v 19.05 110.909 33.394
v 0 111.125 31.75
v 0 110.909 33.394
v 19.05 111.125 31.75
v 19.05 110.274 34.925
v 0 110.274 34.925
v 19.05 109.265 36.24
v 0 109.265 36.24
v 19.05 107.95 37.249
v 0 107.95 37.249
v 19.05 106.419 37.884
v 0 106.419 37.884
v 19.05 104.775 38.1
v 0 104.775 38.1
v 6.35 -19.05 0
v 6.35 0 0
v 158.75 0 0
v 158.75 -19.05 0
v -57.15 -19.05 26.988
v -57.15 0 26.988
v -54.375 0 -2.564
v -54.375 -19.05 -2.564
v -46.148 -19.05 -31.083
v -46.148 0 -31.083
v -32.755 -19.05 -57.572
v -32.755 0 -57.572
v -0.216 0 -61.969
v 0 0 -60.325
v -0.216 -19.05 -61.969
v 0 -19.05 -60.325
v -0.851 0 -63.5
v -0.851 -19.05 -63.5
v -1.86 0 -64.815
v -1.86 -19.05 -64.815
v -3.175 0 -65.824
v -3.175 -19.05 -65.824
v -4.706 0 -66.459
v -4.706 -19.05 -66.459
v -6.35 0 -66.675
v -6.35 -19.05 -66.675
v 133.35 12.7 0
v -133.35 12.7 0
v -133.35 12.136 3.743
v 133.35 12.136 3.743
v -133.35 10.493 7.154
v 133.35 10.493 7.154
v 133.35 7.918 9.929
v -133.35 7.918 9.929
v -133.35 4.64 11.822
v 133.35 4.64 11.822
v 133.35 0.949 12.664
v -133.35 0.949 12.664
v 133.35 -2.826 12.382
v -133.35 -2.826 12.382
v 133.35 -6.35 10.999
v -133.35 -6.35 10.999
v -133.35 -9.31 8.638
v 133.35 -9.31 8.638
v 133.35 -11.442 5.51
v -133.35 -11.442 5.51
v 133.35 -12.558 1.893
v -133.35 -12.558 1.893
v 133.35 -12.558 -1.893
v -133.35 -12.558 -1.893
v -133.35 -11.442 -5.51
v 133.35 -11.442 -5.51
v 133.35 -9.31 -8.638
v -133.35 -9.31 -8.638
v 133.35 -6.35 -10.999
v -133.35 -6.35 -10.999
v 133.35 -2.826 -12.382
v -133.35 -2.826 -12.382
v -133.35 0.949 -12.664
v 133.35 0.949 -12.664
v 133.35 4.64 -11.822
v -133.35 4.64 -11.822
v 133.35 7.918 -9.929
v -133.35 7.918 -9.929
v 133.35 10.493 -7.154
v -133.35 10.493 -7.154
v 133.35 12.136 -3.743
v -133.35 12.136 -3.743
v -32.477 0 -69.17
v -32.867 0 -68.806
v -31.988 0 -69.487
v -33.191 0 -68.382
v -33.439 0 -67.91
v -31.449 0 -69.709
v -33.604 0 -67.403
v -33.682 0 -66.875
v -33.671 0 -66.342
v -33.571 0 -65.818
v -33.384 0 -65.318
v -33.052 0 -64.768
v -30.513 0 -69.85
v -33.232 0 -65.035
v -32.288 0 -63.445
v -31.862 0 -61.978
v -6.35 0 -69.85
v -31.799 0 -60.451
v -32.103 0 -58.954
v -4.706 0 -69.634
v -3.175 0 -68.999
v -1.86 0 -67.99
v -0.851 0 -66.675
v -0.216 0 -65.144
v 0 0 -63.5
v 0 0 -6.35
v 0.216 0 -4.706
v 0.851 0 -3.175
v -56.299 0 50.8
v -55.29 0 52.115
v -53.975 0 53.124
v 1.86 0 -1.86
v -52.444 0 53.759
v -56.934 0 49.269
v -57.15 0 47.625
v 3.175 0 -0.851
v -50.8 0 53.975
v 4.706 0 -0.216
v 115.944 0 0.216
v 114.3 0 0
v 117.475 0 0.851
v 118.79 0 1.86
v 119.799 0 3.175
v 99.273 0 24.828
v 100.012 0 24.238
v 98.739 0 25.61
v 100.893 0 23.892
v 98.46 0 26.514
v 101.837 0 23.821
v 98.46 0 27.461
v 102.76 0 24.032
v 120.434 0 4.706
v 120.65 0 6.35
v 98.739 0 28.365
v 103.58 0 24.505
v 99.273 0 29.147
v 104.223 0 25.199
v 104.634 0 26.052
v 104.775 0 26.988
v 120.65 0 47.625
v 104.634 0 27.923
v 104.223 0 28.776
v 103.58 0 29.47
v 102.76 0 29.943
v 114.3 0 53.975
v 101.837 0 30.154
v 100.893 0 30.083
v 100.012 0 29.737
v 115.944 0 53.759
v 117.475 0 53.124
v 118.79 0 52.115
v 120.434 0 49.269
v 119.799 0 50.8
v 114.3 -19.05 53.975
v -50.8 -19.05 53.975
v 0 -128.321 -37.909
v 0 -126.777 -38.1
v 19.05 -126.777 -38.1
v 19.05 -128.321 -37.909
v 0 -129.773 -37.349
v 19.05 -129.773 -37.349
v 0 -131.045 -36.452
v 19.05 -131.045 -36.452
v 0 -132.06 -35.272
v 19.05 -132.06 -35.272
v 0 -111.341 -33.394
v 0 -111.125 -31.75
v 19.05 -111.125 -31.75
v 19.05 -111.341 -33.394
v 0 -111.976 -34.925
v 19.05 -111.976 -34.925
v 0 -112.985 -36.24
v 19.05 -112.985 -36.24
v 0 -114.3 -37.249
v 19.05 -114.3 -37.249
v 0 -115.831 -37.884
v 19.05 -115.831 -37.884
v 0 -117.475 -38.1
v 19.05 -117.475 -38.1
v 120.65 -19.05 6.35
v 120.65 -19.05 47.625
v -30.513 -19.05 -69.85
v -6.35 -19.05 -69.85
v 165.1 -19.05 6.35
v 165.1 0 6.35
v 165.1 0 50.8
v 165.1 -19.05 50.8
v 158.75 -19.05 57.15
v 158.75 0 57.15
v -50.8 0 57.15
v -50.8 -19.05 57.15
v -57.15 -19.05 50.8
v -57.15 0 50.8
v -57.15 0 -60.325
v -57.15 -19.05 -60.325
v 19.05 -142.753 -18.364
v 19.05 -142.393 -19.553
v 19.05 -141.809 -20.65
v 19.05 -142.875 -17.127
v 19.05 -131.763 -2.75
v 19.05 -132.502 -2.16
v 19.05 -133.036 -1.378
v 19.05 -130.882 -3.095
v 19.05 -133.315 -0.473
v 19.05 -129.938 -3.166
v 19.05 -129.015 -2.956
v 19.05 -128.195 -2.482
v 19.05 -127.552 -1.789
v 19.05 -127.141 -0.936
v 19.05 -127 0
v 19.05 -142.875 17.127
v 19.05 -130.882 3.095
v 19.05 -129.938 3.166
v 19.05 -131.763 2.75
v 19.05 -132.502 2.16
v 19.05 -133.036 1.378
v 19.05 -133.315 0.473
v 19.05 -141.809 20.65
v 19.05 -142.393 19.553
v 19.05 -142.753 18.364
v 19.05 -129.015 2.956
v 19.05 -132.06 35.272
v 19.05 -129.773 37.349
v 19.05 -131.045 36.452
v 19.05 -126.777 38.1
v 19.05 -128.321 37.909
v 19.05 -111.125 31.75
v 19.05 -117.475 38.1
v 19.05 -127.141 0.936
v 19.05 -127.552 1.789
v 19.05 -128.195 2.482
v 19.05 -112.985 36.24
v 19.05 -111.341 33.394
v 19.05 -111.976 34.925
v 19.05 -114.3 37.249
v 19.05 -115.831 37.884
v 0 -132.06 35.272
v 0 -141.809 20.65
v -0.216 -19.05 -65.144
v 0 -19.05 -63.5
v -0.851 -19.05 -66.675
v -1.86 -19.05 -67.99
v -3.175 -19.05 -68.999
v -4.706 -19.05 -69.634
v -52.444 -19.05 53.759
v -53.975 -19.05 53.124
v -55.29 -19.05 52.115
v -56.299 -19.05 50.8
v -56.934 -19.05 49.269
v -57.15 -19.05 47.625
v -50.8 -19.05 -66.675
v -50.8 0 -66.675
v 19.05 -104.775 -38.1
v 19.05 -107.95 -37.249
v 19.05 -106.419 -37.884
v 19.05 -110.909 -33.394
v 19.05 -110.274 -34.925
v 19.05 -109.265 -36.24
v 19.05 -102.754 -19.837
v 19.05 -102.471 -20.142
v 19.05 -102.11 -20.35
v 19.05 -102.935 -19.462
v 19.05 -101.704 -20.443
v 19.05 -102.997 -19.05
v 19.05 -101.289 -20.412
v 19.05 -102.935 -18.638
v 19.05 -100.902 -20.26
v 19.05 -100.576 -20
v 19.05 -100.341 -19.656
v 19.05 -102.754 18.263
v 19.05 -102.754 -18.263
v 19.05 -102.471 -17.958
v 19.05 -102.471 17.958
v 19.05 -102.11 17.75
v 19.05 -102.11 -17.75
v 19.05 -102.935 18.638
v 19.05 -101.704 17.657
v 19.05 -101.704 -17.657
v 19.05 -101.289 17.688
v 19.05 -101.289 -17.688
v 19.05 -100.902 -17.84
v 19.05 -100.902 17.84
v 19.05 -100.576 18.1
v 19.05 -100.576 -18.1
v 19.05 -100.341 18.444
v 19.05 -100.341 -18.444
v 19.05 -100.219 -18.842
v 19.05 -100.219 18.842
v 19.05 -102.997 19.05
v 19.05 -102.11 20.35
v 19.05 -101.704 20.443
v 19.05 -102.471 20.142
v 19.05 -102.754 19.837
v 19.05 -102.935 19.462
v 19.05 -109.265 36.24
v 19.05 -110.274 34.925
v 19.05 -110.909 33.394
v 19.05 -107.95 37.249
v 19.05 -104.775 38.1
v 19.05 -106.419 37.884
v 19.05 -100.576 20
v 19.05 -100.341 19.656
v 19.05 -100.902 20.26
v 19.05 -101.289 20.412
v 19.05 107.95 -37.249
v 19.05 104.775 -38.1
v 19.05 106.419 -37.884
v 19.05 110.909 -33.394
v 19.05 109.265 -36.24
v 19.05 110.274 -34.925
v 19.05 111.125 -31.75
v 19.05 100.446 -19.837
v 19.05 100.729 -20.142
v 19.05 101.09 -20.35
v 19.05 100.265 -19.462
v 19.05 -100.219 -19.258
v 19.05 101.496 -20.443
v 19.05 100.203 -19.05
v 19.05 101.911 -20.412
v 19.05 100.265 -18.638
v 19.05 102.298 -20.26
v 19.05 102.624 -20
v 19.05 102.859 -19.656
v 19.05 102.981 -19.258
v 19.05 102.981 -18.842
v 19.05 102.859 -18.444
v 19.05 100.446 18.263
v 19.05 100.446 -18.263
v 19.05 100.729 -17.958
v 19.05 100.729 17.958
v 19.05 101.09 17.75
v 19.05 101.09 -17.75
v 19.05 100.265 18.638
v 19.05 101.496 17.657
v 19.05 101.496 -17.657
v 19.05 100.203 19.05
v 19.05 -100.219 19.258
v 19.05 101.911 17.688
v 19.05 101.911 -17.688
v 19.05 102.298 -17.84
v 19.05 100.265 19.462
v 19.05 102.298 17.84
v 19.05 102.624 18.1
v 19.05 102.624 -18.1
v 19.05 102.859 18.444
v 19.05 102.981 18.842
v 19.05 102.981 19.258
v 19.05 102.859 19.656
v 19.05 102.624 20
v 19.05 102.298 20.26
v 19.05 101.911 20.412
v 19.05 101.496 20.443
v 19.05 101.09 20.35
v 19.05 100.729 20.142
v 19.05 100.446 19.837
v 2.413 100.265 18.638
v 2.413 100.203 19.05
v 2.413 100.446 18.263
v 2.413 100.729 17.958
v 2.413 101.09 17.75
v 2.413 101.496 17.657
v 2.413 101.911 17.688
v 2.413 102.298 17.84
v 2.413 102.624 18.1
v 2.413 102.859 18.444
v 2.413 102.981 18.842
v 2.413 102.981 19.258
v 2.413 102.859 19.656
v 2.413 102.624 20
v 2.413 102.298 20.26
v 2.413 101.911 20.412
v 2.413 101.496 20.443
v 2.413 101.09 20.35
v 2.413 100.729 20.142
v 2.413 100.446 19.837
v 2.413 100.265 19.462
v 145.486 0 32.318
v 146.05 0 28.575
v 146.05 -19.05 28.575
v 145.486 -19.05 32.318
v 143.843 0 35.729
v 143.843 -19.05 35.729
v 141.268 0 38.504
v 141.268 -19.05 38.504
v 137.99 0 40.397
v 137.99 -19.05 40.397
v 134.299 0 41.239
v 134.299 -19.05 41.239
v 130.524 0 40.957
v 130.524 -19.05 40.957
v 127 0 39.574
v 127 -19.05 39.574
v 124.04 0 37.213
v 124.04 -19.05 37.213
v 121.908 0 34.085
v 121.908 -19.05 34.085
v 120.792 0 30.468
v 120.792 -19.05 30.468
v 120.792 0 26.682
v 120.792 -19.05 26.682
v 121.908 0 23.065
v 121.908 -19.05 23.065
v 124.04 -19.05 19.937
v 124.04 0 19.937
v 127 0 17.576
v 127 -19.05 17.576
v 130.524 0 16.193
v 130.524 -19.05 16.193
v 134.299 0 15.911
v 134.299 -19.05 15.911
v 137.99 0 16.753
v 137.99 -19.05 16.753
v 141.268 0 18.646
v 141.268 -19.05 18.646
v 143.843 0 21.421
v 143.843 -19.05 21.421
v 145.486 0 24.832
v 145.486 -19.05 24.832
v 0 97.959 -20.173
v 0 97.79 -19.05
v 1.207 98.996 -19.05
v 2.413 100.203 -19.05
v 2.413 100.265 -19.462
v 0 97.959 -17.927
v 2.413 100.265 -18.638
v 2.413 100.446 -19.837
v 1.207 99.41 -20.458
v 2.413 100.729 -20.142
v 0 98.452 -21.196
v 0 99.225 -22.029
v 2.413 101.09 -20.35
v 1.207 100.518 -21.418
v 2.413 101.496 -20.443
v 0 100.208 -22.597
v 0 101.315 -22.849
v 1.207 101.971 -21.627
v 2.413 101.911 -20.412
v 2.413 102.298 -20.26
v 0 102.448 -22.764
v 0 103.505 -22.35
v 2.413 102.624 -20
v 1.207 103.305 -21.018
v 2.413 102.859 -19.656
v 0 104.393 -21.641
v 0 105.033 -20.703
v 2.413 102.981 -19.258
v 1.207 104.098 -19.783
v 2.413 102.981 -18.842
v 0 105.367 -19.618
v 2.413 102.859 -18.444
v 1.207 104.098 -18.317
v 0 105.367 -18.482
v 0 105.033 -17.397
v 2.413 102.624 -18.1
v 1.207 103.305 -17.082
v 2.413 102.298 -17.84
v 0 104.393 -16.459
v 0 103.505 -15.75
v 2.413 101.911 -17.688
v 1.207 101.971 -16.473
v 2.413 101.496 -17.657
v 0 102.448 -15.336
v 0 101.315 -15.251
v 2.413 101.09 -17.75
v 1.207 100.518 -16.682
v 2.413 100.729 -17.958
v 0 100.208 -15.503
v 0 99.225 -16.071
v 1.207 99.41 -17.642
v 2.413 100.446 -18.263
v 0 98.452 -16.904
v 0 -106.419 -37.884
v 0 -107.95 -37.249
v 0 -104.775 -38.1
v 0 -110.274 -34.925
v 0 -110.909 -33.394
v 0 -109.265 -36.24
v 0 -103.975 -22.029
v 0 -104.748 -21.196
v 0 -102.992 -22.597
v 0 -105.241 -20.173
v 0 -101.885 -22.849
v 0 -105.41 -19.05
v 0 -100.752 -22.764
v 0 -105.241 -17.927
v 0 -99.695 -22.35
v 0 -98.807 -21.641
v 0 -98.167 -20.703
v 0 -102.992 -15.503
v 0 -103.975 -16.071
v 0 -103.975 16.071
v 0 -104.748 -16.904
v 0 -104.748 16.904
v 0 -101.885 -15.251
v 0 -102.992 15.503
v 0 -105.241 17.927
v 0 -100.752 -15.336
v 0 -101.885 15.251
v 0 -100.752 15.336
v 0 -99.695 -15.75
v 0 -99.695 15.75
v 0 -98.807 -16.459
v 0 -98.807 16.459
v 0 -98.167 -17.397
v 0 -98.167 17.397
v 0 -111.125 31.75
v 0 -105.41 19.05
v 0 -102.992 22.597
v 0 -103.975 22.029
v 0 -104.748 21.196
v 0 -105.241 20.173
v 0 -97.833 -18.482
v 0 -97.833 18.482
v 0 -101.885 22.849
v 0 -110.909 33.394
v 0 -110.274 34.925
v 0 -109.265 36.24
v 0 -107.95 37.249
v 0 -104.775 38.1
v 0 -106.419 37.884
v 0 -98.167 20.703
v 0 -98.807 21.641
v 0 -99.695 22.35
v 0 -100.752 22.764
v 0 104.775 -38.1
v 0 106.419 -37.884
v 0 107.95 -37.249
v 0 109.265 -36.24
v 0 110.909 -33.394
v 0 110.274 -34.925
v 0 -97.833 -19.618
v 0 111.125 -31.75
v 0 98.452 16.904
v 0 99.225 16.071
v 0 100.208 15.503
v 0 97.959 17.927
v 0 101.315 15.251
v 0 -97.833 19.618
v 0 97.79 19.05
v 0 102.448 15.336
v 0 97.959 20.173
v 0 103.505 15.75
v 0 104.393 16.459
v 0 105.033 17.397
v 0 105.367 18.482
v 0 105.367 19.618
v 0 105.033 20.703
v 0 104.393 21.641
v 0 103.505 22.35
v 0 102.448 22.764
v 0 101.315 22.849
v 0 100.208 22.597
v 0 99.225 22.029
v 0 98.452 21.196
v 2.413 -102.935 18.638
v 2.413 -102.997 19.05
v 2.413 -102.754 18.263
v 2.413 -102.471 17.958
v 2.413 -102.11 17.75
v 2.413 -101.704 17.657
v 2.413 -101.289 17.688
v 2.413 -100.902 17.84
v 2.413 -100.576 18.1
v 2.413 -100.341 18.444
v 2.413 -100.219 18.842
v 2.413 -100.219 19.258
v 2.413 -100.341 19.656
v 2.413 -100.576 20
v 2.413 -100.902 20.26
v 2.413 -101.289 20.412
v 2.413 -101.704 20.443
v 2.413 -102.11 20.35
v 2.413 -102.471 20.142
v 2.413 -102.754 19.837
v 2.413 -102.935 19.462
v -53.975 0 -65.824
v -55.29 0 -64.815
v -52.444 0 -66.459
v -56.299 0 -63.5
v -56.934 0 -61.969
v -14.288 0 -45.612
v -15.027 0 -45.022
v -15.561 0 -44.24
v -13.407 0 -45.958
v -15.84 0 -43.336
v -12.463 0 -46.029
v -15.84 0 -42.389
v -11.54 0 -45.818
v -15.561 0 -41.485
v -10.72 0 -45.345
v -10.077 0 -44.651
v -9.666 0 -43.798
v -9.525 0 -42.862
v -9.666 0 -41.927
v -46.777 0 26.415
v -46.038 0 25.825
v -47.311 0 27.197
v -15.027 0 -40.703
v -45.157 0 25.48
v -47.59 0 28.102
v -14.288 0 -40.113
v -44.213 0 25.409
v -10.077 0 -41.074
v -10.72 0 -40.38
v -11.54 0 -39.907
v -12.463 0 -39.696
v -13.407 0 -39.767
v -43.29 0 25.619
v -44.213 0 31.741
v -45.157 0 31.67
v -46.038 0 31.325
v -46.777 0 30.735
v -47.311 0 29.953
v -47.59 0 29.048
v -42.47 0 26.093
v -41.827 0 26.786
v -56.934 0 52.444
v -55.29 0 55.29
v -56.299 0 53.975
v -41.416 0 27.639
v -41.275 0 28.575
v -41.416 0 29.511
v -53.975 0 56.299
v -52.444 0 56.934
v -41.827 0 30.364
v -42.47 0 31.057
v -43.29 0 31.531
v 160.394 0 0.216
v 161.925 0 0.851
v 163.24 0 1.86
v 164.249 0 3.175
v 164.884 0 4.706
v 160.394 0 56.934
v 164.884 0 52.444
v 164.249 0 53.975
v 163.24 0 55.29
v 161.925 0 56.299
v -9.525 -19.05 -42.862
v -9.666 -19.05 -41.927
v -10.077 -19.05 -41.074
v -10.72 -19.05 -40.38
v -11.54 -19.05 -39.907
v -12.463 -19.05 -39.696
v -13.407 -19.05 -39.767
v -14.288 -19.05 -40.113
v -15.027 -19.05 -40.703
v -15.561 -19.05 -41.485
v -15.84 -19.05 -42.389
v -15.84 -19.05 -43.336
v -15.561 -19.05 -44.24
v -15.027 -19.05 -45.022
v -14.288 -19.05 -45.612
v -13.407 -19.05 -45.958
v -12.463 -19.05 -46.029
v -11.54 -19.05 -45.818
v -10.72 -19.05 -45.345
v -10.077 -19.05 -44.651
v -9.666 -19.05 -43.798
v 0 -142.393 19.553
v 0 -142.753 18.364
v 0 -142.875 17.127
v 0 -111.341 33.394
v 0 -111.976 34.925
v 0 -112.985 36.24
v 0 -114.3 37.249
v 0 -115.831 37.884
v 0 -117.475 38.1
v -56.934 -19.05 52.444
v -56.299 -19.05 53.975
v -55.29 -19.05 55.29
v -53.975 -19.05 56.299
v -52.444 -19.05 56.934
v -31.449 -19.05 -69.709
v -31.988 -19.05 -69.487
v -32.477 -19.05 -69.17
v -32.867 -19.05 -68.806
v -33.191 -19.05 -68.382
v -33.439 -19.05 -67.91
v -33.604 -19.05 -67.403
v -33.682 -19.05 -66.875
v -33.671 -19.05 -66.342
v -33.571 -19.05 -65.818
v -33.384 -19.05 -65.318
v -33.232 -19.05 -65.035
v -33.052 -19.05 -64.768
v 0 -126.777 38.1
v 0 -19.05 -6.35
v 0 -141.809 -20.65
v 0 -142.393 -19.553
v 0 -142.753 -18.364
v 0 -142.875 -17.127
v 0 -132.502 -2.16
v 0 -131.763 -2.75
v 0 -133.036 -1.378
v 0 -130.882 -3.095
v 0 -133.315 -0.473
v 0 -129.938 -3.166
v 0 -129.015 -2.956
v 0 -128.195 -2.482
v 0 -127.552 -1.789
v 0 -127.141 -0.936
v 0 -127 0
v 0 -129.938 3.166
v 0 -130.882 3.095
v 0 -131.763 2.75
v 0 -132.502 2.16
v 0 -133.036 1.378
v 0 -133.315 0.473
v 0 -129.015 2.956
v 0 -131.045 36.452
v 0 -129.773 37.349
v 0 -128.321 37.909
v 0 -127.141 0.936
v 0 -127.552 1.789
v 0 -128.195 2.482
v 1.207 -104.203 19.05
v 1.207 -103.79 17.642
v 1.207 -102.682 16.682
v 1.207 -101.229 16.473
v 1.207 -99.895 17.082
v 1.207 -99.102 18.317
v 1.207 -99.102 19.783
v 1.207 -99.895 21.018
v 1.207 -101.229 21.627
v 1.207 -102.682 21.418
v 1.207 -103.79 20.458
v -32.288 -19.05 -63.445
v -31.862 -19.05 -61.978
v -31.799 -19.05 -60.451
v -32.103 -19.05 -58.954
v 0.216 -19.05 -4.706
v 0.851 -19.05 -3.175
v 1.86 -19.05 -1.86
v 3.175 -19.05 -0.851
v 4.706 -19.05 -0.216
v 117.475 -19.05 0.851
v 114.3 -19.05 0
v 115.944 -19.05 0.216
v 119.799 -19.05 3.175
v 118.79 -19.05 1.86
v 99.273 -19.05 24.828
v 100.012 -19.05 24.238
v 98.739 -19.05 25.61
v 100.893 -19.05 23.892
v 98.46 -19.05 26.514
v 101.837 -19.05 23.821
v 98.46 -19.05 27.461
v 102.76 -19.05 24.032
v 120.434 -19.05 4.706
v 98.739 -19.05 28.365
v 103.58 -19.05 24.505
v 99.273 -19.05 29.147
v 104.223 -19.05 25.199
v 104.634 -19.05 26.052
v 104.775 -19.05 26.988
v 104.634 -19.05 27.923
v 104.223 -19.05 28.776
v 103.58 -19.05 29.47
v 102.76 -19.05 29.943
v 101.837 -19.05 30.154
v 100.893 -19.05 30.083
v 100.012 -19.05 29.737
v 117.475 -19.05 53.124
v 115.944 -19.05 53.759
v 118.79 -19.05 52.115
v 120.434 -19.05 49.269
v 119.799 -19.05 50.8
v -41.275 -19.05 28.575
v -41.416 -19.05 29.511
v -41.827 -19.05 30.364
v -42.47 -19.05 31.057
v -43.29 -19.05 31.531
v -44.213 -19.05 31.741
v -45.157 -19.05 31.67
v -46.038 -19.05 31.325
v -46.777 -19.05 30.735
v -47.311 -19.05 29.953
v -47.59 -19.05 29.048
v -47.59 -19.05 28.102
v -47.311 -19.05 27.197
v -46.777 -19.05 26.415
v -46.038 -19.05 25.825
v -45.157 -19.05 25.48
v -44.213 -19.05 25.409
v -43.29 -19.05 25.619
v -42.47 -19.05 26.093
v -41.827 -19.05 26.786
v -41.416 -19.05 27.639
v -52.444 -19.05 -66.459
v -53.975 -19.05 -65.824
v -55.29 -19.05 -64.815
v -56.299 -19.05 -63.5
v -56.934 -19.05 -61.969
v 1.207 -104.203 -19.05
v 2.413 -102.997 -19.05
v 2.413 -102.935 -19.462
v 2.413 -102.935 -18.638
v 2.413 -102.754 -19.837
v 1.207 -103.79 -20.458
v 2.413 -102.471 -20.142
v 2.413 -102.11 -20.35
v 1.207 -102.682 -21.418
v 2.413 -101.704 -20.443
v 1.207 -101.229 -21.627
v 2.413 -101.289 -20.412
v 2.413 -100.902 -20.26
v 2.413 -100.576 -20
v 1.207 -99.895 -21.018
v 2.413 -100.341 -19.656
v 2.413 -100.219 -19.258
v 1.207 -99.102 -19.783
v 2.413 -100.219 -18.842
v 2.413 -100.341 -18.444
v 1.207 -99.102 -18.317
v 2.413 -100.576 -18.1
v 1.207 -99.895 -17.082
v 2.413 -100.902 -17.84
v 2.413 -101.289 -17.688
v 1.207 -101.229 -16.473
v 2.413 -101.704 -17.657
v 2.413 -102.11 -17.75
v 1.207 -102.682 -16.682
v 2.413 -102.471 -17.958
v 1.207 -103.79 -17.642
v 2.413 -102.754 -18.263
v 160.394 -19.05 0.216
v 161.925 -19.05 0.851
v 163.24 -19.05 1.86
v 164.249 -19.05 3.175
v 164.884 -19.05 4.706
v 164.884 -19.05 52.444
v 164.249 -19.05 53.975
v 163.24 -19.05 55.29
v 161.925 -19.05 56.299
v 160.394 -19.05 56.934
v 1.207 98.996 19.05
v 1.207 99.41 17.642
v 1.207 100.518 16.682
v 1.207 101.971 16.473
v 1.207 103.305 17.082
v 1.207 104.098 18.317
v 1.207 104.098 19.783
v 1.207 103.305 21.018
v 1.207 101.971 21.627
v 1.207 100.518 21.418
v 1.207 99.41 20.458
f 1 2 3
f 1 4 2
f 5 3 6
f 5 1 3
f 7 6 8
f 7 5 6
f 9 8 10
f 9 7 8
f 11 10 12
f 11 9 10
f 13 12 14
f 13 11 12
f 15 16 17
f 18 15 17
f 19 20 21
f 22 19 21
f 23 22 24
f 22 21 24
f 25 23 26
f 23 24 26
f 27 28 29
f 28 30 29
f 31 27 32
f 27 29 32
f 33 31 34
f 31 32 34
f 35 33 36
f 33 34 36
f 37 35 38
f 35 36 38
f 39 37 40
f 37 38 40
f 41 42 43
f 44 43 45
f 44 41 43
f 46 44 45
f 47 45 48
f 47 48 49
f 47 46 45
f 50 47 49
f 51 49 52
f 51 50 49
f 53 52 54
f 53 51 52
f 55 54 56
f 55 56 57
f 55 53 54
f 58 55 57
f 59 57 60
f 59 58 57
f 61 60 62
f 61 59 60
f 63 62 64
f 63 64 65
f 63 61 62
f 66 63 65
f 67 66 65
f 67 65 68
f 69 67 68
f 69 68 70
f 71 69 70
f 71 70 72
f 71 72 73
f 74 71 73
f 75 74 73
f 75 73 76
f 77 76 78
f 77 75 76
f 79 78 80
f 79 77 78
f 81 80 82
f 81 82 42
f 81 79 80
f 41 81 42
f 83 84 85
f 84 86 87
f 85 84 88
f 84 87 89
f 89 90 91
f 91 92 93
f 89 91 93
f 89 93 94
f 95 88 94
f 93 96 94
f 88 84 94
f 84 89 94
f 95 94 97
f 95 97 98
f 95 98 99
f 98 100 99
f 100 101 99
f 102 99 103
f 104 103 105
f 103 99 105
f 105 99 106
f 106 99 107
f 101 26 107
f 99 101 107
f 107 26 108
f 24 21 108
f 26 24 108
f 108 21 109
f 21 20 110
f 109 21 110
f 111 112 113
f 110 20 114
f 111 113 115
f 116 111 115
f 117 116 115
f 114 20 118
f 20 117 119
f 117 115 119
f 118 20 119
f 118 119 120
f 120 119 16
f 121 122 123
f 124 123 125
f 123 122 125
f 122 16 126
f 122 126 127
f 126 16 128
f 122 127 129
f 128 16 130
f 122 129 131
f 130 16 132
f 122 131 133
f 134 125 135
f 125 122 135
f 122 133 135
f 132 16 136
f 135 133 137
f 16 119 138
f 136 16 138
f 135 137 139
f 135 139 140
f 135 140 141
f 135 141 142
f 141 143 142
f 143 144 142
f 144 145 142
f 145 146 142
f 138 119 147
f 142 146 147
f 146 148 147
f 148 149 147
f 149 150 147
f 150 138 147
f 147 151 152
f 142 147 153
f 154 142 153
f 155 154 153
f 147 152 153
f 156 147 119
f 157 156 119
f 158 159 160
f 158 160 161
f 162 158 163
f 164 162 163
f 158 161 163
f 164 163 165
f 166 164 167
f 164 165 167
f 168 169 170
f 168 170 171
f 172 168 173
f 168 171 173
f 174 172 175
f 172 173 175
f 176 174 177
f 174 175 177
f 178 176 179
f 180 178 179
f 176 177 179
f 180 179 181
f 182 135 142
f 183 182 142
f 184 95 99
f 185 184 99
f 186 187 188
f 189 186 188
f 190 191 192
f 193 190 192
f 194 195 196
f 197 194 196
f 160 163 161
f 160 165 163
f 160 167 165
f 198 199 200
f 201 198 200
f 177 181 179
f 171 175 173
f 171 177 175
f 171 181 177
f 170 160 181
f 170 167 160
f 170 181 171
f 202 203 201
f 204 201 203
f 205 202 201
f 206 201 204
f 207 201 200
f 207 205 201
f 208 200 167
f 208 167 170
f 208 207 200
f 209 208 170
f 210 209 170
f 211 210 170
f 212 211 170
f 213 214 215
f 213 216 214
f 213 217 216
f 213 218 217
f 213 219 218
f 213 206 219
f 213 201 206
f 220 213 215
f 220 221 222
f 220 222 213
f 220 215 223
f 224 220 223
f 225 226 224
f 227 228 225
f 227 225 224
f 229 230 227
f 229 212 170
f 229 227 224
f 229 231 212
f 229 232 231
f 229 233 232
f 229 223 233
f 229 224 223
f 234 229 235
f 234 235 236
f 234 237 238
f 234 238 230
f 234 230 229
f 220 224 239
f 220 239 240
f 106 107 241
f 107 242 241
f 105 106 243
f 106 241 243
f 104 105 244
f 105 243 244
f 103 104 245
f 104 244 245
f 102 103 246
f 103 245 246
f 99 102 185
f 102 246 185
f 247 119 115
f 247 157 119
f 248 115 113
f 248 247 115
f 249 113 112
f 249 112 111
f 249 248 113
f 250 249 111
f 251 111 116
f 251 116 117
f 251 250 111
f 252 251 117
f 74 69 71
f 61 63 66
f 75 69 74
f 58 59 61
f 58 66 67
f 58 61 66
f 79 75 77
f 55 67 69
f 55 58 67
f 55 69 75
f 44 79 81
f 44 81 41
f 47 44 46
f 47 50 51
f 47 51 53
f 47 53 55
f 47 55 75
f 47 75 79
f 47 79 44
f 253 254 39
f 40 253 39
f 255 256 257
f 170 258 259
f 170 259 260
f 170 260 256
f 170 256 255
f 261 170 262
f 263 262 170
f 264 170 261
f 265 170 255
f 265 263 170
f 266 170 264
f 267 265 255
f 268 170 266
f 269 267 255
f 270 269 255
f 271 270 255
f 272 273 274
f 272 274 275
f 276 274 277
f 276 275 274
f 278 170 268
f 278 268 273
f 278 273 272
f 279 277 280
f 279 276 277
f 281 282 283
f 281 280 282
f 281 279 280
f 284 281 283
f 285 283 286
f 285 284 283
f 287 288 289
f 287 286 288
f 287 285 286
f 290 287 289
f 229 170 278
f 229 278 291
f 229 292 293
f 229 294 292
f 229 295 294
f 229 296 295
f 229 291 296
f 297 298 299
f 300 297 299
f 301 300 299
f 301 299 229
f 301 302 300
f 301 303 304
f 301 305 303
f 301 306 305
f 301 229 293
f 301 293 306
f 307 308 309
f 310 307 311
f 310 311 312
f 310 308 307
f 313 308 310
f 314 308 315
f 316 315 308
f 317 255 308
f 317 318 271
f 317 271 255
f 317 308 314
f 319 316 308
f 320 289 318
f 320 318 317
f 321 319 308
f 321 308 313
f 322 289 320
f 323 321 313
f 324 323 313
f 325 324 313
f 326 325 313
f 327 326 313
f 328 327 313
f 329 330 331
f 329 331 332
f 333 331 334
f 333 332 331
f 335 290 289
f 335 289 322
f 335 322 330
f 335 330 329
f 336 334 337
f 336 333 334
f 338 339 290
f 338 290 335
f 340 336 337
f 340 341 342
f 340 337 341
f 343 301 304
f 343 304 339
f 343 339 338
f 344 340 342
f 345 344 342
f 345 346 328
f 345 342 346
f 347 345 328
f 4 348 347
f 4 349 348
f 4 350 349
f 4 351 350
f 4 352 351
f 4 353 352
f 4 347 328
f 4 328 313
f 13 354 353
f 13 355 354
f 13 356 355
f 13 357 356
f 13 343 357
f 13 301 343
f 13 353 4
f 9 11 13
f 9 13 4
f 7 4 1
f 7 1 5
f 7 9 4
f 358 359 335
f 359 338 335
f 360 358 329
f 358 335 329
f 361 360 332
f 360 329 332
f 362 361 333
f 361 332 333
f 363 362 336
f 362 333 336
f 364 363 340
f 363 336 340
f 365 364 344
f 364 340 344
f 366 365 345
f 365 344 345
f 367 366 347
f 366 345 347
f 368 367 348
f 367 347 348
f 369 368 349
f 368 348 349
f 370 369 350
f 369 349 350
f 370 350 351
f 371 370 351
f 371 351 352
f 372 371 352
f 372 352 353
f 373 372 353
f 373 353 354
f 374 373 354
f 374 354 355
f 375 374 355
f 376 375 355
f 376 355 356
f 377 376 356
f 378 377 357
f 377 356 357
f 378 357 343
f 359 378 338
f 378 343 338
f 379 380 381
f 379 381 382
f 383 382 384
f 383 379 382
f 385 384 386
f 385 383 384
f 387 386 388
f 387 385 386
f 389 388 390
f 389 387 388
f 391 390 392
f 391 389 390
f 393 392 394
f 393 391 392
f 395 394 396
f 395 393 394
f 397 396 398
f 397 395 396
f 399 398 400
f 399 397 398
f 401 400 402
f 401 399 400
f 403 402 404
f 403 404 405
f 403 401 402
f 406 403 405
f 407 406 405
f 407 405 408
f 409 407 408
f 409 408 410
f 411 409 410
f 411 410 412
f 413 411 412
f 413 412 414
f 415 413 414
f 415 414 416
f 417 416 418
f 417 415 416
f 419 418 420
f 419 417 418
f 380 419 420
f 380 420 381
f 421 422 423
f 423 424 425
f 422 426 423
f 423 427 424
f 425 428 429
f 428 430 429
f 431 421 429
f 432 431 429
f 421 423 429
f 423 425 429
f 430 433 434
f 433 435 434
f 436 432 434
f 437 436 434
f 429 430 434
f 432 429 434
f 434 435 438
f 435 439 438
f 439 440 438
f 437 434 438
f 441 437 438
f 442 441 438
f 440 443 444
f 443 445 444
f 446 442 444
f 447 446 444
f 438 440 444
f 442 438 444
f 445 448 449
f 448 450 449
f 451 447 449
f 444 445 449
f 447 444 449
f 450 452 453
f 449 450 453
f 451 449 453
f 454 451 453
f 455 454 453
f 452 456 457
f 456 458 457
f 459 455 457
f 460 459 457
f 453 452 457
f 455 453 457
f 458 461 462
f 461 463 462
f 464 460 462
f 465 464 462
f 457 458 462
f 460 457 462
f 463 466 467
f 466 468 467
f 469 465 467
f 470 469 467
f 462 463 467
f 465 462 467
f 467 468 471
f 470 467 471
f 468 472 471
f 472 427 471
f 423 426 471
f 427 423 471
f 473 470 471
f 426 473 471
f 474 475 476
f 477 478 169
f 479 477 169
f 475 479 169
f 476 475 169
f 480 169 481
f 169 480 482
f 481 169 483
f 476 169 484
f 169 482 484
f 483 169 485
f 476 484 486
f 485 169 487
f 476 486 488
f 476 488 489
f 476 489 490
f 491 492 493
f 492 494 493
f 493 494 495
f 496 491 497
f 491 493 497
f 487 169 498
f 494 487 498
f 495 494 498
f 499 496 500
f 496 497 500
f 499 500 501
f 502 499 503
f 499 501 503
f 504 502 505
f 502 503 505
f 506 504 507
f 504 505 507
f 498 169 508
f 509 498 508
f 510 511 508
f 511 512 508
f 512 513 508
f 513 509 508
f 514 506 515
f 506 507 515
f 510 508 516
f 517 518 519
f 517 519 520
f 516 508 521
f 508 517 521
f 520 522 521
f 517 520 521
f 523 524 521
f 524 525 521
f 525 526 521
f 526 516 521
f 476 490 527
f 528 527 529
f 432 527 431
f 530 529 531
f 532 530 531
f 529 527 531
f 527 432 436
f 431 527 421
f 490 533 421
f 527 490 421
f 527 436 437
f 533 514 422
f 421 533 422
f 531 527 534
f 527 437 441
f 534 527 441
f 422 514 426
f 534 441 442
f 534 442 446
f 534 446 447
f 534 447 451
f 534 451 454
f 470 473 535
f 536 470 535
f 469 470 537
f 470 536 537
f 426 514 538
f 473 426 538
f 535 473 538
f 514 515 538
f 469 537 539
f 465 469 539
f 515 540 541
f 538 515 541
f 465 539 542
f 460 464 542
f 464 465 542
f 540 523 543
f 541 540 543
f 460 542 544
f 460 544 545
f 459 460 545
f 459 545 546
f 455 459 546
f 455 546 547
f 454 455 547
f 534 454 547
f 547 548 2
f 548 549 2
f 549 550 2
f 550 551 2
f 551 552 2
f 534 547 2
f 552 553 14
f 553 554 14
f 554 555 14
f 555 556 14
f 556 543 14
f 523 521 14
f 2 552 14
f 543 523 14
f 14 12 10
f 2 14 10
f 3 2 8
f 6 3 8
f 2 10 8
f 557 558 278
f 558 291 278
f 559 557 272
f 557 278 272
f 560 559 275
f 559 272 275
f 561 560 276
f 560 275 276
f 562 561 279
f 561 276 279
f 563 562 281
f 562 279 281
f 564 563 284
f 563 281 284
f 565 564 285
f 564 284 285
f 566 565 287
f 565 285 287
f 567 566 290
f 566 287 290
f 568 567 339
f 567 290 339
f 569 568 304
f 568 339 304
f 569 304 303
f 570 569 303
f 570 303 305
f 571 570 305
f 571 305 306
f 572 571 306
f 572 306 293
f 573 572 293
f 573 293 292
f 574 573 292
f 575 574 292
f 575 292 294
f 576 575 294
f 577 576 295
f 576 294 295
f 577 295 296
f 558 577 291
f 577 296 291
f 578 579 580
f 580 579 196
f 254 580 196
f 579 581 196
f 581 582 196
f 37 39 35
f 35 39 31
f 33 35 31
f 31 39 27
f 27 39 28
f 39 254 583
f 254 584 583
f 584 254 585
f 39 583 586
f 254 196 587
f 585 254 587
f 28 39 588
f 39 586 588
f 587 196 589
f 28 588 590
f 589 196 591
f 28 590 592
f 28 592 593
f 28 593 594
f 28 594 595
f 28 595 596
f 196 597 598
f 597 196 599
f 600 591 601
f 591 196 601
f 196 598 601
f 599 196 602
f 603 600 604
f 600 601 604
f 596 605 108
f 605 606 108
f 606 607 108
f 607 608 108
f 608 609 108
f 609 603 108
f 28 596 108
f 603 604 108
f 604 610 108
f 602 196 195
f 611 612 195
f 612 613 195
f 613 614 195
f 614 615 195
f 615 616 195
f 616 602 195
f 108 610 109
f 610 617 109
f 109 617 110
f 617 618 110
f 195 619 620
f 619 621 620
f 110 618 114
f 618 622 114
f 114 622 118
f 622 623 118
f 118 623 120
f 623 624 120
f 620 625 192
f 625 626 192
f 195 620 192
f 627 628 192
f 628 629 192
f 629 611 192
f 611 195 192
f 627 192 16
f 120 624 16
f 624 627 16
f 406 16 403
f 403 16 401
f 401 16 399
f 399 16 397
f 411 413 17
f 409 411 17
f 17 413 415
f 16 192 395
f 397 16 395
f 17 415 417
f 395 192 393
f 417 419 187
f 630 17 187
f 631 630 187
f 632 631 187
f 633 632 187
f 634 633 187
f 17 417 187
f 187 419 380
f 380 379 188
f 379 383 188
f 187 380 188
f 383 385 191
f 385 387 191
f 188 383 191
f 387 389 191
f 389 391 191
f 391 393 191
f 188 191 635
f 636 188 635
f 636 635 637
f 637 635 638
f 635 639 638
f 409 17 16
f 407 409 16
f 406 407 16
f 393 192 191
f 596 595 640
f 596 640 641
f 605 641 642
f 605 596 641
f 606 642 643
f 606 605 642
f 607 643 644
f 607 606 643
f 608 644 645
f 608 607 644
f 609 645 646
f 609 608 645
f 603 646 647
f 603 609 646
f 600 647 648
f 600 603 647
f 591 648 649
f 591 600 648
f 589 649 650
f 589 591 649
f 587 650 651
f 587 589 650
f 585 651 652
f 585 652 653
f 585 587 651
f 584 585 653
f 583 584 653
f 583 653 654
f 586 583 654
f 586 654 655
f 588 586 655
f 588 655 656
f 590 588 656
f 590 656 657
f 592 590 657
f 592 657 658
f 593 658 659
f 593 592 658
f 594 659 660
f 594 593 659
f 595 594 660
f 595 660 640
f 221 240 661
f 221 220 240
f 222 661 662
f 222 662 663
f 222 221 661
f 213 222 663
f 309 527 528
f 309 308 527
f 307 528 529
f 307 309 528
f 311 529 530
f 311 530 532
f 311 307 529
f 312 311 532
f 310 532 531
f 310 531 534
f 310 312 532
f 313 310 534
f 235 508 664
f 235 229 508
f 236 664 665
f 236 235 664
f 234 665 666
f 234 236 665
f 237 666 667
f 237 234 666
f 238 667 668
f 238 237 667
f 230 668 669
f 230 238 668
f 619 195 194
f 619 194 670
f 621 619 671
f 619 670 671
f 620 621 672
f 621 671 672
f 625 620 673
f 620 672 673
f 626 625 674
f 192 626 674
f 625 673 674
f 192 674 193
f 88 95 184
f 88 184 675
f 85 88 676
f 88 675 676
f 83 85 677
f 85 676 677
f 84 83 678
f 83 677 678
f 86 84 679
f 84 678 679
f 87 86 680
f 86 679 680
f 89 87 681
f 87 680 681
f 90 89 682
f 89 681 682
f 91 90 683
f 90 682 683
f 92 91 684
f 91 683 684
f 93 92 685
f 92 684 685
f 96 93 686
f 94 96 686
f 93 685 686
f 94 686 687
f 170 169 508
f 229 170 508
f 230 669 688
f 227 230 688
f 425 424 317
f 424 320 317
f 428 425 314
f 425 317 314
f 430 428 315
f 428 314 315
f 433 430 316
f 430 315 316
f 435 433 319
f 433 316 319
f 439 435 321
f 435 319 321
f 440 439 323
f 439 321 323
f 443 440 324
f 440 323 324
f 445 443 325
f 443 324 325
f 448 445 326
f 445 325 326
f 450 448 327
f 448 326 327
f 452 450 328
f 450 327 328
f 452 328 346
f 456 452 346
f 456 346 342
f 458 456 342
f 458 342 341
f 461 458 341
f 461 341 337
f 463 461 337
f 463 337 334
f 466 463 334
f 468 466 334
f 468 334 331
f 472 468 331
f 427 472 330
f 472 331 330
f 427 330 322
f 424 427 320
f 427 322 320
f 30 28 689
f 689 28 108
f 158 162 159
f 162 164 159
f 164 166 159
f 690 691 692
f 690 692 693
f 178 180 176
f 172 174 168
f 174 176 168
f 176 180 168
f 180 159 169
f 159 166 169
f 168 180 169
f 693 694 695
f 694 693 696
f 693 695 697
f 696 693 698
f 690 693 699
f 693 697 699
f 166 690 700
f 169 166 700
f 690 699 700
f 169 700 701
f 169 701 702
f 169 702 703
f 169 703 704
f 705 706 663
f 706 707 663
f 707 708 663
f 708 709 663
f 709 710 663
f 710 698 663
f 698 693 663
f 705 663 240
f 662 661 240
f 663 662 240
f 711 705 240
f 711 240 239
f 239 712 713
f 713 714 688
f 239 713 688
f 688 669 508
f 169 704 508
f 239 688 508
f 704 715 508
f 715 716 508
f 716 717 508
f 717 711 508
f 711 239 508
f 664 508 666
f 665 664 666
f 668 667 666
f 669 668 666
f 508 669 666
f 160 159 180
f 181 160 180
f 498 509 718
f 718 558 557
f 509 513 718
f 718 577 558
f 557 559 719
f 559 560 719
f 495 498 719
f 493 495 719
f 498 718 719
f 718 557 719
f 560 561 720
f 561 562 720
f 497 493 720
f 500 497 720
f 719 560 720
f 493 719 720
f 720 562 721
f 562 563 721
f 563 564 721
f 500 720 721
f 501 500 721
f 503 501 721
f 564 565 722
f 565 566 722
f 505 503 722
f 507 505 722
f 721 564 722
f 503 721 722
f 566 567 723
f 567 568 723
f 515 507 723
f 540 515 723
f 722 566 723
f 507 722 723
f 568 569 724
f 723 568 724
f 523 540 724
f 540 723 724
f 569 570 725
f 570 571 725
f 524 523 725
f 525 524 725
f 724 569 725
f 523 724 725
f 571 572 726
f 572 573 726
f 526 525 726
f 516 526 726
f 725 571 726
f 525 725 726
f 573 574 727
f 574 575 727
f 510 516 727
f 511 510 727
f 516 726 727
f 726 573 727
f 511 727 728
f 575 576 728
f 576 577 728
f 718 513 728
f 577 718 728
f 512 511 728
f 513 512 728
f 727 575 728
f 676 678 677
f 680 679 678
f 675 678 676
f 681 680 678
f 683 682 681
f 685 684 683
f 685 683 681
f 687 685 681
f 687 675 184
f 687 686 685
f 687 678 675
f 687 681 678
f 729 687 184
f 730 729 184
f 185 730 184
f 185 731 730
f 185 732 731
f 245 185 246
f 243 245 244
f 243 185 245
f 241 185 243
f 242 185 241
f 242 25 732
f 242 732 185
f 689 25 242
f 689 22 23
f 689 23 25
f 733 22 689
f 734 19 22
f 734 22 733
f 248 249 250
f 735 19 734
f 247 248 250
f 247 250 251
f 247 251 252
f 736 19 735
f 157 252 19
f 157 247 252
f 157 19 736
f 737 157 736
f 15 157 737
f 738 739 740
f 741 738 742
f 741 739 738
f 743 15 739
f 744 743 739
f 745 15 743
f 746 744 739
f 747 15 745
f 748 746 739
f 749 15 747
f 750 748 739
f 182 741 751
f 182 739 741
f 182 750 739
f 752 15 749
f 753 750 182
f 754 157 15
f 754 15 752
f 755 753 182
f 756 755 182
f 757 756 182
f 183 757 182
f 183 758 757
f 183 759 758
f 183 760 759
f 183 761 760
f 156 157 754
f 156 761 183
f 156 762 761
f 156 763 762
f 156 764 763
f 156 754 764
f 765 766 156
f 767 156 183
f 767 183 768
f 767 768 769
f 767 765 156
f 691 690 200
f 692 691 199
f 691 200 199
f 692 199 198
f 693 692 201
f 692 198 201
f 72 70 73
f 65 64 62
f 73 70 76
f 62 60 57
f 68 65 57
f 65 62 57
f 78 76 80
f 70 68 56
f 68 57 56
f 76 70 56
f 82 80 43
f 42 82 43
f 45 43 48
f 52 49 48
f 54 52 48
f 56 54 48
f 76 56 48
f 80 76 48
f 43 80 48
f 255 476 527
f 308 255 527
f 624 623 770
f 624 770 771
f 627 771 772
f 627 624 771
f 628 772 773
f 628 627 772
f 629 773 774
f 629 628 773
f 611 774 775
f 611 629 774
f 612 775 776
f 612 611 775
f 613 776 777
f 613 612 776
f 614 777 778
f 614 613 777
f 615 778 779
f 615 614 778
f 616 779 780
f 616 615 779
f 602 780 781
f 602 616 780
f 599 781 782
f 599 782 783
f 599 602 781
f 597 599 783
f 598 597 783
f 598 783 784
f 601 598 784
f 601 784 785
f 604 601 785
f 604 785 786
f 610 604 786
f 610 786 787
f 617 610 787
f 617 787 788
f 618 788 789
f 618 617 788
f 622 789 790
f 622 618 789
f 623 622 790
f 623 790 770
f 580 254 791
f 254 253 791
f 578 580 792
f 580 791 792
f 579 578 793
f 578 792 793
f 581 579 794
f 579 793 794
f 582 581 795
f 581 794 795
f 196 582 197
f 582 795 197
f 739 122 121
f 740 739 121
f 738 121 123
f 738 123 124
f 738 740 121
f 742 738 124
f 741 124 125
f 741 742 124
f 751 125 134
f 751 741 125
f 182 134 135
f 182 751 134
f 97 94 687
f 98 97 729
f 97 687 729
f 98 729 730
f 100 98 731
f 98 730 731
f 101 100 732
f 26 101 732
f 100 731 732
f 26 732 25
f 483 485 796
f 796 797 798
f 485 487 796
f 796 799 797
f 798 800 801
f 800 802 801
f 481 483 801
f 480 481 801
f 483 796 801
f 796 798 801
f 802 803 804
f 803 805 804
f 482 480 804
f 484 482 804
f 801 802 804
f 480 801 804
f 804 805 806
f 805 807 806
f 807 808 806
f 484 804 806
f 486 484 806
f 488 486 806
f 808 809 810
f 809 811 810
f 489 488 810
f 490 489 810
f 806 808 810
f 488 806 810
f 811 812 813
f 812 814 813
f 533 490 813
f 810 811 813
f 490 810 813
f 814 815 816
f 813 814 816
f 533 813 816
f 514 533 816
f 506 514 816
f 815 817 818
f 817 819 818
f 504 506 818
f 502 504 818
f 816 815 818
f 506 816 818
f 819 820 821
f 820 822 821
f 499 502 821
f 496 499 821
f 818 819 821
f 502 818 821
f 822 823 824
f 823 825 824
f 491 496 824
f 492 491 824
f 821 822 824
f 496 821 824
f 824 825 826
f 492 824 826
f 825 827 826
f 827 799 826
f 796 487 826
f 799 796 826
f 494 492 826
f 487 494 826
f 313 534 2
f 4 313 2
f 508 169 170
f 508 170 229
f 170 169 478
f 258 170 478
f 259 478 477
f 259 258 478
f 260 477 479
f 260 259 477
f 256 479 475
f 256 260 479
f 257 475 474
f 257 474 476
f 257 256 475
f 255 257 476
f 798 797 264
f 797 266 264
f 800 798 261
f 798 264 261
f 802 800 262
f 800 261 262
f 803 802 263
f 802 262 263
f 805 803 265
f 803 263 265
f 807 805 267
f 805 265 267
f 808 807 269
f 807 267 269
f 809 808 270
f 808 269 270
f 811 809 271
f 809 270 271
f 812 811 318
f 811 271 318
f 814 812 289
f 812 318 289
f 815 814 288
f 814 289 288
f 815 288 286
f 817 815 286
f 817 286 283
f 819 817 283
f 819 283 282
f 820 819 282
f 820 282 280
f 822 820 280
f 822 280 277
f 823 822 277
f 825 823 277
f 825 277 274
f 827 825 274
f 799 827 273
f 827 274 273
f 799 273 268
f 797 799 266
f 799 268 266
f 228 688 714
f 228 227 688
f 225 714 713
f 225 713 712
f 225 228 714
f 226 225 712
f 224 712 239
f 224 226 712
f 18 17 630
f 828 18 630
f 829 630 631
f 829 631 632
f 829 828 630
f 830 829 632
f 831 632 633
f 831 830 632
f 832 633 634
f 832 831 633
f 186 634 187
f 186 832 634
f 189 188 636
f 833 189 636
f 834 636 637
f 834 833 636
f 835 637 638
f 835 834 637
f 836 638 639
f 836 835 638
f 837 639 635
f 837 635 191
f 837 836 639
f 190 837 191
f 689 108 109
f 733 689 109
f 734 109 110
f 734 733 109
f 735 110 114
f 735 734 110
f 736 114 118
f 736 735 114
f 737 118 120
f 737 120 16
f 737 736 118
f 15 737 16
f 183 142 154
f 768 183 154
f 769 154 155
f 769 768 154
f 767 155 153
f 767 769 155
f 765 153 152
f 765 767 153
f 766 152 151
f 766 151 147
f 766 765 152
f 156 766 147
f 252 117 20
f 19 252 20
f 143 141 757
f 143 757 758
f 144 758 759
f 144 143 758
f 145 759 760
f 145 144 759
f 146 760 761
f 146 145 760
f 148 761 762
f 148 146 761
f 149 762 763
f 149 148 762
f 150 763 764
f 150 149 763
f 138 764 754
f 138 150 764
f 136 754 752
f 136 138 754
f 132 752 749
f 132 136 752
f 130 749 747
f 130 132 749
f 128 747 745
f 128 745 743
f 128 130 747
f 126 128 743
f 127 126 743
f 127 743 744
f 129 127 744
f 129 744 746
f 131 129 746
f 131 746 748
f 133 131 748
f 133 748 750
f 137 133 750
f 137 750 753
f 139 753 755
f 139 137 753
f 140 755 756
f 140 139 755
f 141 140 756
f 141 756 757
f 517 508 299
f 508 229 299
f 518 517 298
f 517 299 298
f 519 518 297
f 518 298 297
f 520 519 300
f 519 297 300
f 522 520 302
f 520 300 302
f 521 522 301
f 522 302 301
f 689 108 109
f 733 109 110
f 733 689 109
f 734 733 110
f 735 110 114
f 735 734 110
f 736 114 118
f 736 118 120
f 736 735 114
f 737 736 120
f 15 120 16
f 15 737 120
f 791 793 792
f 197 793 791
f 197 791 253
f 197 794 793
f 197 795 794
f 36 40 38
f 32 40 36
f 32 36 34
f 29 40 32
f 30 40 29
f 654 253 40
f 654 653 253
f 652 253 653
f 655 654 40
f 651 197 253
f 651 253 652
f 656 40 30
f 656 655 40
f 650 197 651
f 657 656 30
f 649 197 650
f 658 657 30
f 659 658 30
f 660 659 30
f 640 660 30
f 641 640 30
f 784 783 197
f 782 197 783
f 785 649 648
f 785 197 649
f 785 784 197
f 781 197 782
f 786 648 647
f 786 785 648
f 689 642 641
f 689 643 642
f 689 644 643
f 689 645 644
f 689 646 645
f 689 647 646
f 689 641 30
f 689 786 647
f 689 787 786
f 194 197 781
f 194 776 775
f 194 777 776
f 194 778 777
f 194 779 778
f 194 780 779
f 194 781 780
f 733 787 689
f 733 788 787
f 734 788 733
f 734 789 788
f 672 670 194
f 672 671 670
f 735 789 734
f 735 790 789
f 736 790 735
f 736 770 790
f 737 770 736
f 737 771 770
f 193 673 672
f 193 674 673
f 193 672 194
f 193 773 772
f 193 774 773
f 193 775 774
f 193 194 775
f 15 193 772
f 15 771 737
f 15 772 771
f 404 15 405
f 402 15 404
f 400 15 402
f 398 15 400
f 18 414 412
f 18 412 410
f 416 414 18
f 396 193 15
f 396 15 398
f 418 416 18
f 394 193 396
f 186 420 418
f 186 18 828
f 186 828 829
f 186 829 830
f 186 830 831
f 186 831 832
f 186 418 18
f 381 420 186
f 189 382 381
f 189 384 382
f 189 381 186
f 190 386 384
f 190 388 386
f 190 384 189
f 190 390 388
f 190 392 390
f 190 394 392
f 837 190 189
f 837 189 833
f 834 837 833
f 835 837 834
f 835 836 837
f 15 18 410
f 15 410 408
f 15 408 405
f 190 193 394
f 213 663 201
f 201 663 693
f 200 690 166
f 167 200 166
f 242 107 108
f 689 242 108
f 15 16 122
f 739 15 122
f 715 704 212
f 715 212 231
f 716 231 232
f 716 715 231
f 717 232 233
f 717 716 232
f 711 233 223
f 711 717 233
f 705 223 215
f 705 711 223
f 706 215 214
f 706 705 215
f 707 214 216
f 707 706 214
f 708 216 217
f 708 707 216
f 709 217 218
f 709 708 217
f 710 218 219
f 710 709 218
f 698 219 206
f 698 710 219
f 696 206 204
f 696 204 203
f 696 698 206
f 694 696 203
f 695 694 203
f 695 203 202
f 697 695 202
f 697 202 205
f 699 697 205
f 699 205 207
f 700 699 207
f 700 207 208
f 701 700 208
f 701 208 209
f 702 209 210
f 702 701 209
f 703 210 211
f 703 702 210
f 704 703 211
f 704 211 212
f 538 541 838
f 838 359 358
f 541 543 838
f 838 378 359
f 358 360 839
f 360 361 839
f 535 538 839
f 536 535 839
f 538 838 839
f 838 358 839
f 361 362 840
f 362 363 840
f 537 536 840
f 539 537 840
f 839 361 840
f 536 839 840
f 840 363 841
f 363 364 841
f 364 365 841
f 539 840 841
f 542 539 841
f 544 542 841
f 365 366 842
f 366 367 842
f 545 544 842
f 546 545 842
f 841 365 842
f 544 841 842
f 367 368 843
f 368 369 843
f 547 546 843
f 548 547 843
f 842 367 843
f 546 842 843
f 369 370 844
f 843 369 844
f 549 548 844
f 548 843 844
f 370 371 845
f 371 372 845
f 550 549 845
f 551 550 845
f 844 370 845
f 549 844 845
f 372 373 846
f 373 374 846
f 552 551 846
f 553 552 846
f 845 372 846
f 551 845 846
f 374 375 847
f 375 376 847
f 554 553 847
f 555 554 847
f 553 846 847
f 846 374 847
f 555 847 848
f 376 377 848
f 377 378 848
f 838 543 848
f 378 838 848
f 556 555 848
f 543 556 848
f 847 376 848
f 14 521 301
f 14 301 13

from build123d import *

# Parameters (mm, degrees)
F0_R            = 3.175
F0_R_2          = 12.7
F1_DEPTH        = 19.05
F2_R            = 6.35
F3_R            = 3.175
F4_DEPTH        = 19.05
F5_R            = 6.35
F6_R            = 3.175
F7_W            = 222.25
F7_H            = 76.2
F8_DEPTH        = 19.05
F7_R            = 3.175
F9_DEPTH        = 19.05
F10_R           = 12.7
F11_DEPTH       = 133.35
F12_R           = 6.35
F12_2_R         = 6.35
F13_D           = 2.794
F13_CSINK_D     = 7.62
F13_CSINK_ANGLE = 90


with BuildPart() as f1:
    # F0 (on Front) → F1 (new body)
    with BuildSketch(Plane.XZ):
        Polygon((0, -66.675), (0, 0), (165.1, 0), (165.1, 57.15), (-57.15, 57.15), (-57.15, -66.675), align=None)
        with Locations((-12.7, -42.8625)):
            Circle(F0_R, mode=Mode.SUBTRACT)
        with Locations((-44.45, 28.575)):
            Circle(F0_R, mode=Mode.SUBTRACT)
        with Locations((133.35, 28.575)):
            Circle(F0_R_2, mode=Mode.SUBTRACT)
    extrude(amount=F1_DEPTH)

    # F2
    f2_edges = [f1.edges().sort_by_distance(p)[0] for p in [
        (0, -9.525, 0),
        (-57.15, -9.525, 57.15),
        (165.1, -9.525, 57.15),
        (165.1, -9.525, 0),
        (-57.15, -9.525, -66.675),
        (0, -9.525, -66.675),
    ]]
    fillet(f2_edges, radius=F2_R)


with BuildPart() as f4:
    # F3 (on Front) → F4 (new body)
    with BuildSketch(Plane.XZ):
        with BuildLine():
            Line((0, -69.85), (0, 0))
            Line((0, 0), (120.65, 0))
            Line((120.65, 0), (120.65, 53.975))
            Line((120.65, 53.975), (-57.15, 53.975))
            Line((-57.15, 53.975), (-57.15, 26.9875))
            ThreePointArc((-57.15, 26.9875), (-50.0547683455, -19.9421679945), (-29.4033072368, -62.6768518519))
            Line((-29.4033072368, -62.6768518519), (-39.8835718158, -69.85))
            Line((-39.8835718158, -69.85), (0, -69.85))
        make_face()
        with Locations((101.6, 26.9875)):
            Circle(F3_R, mode=Mode.SUBTRACT)
    extrude(amount=F4_DEPTH)

    # F5
    f5_edges = [f4.edges().sort_by_distance(p)[0] for p in [
        (-57.15, -9.525, 53.975),
        (-29.403307, -9.525, -62.676852),
        (0, -9.525, -69.85),
        (0, -9.525, 0),
        (120.65, -9.525, 0),
        (120.65, -9.525, 53.975),
    ]]
    fillet(f5_edges, radius=F5_R)

    # F6
    f6_edges = [f4.edges().sort_by_distance(p)[0] for p in [
        (-39.883572, -9.525, -69.85),
    ]]
    fillet(f6_edges, radius=F6_R)


with BuildPart() as f8:
    # F7 (on Right) → F8 (new body)
    with BuildSketch(Plane.YZ):
        Rectangle(F7_W, F7_H)
    extrude(amount=F8_DEPTH)

    # F12#2
    f12_2_edges = [f8.edges().sort_by_distance(p)[0] for p in [
        (9.525, -111.125, 38.1),
        (9.525, -111.125, -38.1),
        (9.525, 111.125, -38.1),
        (9.525, 111.125, 38.1),
    ]]
    fillet(f12_2_edges, radius=F12_2_R)

    # F13 (through all)
    with Locations(Plane(origin=(0, 0, 0), x_dir=(0, 1, 0), z_dir=(-1, 0, 0))):
        with Locations((-101.6, -19.05), (-101.6, 19.05), (101.6, 19.05), (101.6, -19.05)):
            CounterSinkHole(F13_D / 2, F13_CSINK_D / 2, counter_sink_angle=F13_CSINK_ANGLE)


with BuildPart() as f9:
    # F7 (on Right) → F9 (new body)
    with BuildSketch(Plane.YZ):
        Polygon((-111.125, -38.1), (-111.125, 38.1), (-130.175, 38.1), (-142.875, 19.05), (-142.875, -19.05), (-130.175, -38.1), align=None)
        with Locations((-130.175, 0)):
            Circle(F7_R, mode=Mode.SUBTRACT)
    extrude(amount=F9_DEPTH)

    # F12
    f12_edges = [f9.edges().sort_by_distance(p)[0] for p in [
        (9.525, -111.125, 38.1),
        (9.525, -130.175, 38.1),
        (9.525, -142.875, 19.05),
        (9.525, -142.875, -19.05),
        (9.525, -130.175, -38.1),
        (9.525, -111.125, -38.1),
    ]]
    fillet(f12_edges, radius=F12_R)


with BuildPart() as f11:
    # F10 (on Right) → F11 (new body, symmetric)
    with BuildSketch(Plane.YZ):
        Circle(F10_R)
    extrude(amount=F11_DEPTH, both=True)


solid = Compound([f1.part, f4.part, f8.part, f9.part, f11.part])
